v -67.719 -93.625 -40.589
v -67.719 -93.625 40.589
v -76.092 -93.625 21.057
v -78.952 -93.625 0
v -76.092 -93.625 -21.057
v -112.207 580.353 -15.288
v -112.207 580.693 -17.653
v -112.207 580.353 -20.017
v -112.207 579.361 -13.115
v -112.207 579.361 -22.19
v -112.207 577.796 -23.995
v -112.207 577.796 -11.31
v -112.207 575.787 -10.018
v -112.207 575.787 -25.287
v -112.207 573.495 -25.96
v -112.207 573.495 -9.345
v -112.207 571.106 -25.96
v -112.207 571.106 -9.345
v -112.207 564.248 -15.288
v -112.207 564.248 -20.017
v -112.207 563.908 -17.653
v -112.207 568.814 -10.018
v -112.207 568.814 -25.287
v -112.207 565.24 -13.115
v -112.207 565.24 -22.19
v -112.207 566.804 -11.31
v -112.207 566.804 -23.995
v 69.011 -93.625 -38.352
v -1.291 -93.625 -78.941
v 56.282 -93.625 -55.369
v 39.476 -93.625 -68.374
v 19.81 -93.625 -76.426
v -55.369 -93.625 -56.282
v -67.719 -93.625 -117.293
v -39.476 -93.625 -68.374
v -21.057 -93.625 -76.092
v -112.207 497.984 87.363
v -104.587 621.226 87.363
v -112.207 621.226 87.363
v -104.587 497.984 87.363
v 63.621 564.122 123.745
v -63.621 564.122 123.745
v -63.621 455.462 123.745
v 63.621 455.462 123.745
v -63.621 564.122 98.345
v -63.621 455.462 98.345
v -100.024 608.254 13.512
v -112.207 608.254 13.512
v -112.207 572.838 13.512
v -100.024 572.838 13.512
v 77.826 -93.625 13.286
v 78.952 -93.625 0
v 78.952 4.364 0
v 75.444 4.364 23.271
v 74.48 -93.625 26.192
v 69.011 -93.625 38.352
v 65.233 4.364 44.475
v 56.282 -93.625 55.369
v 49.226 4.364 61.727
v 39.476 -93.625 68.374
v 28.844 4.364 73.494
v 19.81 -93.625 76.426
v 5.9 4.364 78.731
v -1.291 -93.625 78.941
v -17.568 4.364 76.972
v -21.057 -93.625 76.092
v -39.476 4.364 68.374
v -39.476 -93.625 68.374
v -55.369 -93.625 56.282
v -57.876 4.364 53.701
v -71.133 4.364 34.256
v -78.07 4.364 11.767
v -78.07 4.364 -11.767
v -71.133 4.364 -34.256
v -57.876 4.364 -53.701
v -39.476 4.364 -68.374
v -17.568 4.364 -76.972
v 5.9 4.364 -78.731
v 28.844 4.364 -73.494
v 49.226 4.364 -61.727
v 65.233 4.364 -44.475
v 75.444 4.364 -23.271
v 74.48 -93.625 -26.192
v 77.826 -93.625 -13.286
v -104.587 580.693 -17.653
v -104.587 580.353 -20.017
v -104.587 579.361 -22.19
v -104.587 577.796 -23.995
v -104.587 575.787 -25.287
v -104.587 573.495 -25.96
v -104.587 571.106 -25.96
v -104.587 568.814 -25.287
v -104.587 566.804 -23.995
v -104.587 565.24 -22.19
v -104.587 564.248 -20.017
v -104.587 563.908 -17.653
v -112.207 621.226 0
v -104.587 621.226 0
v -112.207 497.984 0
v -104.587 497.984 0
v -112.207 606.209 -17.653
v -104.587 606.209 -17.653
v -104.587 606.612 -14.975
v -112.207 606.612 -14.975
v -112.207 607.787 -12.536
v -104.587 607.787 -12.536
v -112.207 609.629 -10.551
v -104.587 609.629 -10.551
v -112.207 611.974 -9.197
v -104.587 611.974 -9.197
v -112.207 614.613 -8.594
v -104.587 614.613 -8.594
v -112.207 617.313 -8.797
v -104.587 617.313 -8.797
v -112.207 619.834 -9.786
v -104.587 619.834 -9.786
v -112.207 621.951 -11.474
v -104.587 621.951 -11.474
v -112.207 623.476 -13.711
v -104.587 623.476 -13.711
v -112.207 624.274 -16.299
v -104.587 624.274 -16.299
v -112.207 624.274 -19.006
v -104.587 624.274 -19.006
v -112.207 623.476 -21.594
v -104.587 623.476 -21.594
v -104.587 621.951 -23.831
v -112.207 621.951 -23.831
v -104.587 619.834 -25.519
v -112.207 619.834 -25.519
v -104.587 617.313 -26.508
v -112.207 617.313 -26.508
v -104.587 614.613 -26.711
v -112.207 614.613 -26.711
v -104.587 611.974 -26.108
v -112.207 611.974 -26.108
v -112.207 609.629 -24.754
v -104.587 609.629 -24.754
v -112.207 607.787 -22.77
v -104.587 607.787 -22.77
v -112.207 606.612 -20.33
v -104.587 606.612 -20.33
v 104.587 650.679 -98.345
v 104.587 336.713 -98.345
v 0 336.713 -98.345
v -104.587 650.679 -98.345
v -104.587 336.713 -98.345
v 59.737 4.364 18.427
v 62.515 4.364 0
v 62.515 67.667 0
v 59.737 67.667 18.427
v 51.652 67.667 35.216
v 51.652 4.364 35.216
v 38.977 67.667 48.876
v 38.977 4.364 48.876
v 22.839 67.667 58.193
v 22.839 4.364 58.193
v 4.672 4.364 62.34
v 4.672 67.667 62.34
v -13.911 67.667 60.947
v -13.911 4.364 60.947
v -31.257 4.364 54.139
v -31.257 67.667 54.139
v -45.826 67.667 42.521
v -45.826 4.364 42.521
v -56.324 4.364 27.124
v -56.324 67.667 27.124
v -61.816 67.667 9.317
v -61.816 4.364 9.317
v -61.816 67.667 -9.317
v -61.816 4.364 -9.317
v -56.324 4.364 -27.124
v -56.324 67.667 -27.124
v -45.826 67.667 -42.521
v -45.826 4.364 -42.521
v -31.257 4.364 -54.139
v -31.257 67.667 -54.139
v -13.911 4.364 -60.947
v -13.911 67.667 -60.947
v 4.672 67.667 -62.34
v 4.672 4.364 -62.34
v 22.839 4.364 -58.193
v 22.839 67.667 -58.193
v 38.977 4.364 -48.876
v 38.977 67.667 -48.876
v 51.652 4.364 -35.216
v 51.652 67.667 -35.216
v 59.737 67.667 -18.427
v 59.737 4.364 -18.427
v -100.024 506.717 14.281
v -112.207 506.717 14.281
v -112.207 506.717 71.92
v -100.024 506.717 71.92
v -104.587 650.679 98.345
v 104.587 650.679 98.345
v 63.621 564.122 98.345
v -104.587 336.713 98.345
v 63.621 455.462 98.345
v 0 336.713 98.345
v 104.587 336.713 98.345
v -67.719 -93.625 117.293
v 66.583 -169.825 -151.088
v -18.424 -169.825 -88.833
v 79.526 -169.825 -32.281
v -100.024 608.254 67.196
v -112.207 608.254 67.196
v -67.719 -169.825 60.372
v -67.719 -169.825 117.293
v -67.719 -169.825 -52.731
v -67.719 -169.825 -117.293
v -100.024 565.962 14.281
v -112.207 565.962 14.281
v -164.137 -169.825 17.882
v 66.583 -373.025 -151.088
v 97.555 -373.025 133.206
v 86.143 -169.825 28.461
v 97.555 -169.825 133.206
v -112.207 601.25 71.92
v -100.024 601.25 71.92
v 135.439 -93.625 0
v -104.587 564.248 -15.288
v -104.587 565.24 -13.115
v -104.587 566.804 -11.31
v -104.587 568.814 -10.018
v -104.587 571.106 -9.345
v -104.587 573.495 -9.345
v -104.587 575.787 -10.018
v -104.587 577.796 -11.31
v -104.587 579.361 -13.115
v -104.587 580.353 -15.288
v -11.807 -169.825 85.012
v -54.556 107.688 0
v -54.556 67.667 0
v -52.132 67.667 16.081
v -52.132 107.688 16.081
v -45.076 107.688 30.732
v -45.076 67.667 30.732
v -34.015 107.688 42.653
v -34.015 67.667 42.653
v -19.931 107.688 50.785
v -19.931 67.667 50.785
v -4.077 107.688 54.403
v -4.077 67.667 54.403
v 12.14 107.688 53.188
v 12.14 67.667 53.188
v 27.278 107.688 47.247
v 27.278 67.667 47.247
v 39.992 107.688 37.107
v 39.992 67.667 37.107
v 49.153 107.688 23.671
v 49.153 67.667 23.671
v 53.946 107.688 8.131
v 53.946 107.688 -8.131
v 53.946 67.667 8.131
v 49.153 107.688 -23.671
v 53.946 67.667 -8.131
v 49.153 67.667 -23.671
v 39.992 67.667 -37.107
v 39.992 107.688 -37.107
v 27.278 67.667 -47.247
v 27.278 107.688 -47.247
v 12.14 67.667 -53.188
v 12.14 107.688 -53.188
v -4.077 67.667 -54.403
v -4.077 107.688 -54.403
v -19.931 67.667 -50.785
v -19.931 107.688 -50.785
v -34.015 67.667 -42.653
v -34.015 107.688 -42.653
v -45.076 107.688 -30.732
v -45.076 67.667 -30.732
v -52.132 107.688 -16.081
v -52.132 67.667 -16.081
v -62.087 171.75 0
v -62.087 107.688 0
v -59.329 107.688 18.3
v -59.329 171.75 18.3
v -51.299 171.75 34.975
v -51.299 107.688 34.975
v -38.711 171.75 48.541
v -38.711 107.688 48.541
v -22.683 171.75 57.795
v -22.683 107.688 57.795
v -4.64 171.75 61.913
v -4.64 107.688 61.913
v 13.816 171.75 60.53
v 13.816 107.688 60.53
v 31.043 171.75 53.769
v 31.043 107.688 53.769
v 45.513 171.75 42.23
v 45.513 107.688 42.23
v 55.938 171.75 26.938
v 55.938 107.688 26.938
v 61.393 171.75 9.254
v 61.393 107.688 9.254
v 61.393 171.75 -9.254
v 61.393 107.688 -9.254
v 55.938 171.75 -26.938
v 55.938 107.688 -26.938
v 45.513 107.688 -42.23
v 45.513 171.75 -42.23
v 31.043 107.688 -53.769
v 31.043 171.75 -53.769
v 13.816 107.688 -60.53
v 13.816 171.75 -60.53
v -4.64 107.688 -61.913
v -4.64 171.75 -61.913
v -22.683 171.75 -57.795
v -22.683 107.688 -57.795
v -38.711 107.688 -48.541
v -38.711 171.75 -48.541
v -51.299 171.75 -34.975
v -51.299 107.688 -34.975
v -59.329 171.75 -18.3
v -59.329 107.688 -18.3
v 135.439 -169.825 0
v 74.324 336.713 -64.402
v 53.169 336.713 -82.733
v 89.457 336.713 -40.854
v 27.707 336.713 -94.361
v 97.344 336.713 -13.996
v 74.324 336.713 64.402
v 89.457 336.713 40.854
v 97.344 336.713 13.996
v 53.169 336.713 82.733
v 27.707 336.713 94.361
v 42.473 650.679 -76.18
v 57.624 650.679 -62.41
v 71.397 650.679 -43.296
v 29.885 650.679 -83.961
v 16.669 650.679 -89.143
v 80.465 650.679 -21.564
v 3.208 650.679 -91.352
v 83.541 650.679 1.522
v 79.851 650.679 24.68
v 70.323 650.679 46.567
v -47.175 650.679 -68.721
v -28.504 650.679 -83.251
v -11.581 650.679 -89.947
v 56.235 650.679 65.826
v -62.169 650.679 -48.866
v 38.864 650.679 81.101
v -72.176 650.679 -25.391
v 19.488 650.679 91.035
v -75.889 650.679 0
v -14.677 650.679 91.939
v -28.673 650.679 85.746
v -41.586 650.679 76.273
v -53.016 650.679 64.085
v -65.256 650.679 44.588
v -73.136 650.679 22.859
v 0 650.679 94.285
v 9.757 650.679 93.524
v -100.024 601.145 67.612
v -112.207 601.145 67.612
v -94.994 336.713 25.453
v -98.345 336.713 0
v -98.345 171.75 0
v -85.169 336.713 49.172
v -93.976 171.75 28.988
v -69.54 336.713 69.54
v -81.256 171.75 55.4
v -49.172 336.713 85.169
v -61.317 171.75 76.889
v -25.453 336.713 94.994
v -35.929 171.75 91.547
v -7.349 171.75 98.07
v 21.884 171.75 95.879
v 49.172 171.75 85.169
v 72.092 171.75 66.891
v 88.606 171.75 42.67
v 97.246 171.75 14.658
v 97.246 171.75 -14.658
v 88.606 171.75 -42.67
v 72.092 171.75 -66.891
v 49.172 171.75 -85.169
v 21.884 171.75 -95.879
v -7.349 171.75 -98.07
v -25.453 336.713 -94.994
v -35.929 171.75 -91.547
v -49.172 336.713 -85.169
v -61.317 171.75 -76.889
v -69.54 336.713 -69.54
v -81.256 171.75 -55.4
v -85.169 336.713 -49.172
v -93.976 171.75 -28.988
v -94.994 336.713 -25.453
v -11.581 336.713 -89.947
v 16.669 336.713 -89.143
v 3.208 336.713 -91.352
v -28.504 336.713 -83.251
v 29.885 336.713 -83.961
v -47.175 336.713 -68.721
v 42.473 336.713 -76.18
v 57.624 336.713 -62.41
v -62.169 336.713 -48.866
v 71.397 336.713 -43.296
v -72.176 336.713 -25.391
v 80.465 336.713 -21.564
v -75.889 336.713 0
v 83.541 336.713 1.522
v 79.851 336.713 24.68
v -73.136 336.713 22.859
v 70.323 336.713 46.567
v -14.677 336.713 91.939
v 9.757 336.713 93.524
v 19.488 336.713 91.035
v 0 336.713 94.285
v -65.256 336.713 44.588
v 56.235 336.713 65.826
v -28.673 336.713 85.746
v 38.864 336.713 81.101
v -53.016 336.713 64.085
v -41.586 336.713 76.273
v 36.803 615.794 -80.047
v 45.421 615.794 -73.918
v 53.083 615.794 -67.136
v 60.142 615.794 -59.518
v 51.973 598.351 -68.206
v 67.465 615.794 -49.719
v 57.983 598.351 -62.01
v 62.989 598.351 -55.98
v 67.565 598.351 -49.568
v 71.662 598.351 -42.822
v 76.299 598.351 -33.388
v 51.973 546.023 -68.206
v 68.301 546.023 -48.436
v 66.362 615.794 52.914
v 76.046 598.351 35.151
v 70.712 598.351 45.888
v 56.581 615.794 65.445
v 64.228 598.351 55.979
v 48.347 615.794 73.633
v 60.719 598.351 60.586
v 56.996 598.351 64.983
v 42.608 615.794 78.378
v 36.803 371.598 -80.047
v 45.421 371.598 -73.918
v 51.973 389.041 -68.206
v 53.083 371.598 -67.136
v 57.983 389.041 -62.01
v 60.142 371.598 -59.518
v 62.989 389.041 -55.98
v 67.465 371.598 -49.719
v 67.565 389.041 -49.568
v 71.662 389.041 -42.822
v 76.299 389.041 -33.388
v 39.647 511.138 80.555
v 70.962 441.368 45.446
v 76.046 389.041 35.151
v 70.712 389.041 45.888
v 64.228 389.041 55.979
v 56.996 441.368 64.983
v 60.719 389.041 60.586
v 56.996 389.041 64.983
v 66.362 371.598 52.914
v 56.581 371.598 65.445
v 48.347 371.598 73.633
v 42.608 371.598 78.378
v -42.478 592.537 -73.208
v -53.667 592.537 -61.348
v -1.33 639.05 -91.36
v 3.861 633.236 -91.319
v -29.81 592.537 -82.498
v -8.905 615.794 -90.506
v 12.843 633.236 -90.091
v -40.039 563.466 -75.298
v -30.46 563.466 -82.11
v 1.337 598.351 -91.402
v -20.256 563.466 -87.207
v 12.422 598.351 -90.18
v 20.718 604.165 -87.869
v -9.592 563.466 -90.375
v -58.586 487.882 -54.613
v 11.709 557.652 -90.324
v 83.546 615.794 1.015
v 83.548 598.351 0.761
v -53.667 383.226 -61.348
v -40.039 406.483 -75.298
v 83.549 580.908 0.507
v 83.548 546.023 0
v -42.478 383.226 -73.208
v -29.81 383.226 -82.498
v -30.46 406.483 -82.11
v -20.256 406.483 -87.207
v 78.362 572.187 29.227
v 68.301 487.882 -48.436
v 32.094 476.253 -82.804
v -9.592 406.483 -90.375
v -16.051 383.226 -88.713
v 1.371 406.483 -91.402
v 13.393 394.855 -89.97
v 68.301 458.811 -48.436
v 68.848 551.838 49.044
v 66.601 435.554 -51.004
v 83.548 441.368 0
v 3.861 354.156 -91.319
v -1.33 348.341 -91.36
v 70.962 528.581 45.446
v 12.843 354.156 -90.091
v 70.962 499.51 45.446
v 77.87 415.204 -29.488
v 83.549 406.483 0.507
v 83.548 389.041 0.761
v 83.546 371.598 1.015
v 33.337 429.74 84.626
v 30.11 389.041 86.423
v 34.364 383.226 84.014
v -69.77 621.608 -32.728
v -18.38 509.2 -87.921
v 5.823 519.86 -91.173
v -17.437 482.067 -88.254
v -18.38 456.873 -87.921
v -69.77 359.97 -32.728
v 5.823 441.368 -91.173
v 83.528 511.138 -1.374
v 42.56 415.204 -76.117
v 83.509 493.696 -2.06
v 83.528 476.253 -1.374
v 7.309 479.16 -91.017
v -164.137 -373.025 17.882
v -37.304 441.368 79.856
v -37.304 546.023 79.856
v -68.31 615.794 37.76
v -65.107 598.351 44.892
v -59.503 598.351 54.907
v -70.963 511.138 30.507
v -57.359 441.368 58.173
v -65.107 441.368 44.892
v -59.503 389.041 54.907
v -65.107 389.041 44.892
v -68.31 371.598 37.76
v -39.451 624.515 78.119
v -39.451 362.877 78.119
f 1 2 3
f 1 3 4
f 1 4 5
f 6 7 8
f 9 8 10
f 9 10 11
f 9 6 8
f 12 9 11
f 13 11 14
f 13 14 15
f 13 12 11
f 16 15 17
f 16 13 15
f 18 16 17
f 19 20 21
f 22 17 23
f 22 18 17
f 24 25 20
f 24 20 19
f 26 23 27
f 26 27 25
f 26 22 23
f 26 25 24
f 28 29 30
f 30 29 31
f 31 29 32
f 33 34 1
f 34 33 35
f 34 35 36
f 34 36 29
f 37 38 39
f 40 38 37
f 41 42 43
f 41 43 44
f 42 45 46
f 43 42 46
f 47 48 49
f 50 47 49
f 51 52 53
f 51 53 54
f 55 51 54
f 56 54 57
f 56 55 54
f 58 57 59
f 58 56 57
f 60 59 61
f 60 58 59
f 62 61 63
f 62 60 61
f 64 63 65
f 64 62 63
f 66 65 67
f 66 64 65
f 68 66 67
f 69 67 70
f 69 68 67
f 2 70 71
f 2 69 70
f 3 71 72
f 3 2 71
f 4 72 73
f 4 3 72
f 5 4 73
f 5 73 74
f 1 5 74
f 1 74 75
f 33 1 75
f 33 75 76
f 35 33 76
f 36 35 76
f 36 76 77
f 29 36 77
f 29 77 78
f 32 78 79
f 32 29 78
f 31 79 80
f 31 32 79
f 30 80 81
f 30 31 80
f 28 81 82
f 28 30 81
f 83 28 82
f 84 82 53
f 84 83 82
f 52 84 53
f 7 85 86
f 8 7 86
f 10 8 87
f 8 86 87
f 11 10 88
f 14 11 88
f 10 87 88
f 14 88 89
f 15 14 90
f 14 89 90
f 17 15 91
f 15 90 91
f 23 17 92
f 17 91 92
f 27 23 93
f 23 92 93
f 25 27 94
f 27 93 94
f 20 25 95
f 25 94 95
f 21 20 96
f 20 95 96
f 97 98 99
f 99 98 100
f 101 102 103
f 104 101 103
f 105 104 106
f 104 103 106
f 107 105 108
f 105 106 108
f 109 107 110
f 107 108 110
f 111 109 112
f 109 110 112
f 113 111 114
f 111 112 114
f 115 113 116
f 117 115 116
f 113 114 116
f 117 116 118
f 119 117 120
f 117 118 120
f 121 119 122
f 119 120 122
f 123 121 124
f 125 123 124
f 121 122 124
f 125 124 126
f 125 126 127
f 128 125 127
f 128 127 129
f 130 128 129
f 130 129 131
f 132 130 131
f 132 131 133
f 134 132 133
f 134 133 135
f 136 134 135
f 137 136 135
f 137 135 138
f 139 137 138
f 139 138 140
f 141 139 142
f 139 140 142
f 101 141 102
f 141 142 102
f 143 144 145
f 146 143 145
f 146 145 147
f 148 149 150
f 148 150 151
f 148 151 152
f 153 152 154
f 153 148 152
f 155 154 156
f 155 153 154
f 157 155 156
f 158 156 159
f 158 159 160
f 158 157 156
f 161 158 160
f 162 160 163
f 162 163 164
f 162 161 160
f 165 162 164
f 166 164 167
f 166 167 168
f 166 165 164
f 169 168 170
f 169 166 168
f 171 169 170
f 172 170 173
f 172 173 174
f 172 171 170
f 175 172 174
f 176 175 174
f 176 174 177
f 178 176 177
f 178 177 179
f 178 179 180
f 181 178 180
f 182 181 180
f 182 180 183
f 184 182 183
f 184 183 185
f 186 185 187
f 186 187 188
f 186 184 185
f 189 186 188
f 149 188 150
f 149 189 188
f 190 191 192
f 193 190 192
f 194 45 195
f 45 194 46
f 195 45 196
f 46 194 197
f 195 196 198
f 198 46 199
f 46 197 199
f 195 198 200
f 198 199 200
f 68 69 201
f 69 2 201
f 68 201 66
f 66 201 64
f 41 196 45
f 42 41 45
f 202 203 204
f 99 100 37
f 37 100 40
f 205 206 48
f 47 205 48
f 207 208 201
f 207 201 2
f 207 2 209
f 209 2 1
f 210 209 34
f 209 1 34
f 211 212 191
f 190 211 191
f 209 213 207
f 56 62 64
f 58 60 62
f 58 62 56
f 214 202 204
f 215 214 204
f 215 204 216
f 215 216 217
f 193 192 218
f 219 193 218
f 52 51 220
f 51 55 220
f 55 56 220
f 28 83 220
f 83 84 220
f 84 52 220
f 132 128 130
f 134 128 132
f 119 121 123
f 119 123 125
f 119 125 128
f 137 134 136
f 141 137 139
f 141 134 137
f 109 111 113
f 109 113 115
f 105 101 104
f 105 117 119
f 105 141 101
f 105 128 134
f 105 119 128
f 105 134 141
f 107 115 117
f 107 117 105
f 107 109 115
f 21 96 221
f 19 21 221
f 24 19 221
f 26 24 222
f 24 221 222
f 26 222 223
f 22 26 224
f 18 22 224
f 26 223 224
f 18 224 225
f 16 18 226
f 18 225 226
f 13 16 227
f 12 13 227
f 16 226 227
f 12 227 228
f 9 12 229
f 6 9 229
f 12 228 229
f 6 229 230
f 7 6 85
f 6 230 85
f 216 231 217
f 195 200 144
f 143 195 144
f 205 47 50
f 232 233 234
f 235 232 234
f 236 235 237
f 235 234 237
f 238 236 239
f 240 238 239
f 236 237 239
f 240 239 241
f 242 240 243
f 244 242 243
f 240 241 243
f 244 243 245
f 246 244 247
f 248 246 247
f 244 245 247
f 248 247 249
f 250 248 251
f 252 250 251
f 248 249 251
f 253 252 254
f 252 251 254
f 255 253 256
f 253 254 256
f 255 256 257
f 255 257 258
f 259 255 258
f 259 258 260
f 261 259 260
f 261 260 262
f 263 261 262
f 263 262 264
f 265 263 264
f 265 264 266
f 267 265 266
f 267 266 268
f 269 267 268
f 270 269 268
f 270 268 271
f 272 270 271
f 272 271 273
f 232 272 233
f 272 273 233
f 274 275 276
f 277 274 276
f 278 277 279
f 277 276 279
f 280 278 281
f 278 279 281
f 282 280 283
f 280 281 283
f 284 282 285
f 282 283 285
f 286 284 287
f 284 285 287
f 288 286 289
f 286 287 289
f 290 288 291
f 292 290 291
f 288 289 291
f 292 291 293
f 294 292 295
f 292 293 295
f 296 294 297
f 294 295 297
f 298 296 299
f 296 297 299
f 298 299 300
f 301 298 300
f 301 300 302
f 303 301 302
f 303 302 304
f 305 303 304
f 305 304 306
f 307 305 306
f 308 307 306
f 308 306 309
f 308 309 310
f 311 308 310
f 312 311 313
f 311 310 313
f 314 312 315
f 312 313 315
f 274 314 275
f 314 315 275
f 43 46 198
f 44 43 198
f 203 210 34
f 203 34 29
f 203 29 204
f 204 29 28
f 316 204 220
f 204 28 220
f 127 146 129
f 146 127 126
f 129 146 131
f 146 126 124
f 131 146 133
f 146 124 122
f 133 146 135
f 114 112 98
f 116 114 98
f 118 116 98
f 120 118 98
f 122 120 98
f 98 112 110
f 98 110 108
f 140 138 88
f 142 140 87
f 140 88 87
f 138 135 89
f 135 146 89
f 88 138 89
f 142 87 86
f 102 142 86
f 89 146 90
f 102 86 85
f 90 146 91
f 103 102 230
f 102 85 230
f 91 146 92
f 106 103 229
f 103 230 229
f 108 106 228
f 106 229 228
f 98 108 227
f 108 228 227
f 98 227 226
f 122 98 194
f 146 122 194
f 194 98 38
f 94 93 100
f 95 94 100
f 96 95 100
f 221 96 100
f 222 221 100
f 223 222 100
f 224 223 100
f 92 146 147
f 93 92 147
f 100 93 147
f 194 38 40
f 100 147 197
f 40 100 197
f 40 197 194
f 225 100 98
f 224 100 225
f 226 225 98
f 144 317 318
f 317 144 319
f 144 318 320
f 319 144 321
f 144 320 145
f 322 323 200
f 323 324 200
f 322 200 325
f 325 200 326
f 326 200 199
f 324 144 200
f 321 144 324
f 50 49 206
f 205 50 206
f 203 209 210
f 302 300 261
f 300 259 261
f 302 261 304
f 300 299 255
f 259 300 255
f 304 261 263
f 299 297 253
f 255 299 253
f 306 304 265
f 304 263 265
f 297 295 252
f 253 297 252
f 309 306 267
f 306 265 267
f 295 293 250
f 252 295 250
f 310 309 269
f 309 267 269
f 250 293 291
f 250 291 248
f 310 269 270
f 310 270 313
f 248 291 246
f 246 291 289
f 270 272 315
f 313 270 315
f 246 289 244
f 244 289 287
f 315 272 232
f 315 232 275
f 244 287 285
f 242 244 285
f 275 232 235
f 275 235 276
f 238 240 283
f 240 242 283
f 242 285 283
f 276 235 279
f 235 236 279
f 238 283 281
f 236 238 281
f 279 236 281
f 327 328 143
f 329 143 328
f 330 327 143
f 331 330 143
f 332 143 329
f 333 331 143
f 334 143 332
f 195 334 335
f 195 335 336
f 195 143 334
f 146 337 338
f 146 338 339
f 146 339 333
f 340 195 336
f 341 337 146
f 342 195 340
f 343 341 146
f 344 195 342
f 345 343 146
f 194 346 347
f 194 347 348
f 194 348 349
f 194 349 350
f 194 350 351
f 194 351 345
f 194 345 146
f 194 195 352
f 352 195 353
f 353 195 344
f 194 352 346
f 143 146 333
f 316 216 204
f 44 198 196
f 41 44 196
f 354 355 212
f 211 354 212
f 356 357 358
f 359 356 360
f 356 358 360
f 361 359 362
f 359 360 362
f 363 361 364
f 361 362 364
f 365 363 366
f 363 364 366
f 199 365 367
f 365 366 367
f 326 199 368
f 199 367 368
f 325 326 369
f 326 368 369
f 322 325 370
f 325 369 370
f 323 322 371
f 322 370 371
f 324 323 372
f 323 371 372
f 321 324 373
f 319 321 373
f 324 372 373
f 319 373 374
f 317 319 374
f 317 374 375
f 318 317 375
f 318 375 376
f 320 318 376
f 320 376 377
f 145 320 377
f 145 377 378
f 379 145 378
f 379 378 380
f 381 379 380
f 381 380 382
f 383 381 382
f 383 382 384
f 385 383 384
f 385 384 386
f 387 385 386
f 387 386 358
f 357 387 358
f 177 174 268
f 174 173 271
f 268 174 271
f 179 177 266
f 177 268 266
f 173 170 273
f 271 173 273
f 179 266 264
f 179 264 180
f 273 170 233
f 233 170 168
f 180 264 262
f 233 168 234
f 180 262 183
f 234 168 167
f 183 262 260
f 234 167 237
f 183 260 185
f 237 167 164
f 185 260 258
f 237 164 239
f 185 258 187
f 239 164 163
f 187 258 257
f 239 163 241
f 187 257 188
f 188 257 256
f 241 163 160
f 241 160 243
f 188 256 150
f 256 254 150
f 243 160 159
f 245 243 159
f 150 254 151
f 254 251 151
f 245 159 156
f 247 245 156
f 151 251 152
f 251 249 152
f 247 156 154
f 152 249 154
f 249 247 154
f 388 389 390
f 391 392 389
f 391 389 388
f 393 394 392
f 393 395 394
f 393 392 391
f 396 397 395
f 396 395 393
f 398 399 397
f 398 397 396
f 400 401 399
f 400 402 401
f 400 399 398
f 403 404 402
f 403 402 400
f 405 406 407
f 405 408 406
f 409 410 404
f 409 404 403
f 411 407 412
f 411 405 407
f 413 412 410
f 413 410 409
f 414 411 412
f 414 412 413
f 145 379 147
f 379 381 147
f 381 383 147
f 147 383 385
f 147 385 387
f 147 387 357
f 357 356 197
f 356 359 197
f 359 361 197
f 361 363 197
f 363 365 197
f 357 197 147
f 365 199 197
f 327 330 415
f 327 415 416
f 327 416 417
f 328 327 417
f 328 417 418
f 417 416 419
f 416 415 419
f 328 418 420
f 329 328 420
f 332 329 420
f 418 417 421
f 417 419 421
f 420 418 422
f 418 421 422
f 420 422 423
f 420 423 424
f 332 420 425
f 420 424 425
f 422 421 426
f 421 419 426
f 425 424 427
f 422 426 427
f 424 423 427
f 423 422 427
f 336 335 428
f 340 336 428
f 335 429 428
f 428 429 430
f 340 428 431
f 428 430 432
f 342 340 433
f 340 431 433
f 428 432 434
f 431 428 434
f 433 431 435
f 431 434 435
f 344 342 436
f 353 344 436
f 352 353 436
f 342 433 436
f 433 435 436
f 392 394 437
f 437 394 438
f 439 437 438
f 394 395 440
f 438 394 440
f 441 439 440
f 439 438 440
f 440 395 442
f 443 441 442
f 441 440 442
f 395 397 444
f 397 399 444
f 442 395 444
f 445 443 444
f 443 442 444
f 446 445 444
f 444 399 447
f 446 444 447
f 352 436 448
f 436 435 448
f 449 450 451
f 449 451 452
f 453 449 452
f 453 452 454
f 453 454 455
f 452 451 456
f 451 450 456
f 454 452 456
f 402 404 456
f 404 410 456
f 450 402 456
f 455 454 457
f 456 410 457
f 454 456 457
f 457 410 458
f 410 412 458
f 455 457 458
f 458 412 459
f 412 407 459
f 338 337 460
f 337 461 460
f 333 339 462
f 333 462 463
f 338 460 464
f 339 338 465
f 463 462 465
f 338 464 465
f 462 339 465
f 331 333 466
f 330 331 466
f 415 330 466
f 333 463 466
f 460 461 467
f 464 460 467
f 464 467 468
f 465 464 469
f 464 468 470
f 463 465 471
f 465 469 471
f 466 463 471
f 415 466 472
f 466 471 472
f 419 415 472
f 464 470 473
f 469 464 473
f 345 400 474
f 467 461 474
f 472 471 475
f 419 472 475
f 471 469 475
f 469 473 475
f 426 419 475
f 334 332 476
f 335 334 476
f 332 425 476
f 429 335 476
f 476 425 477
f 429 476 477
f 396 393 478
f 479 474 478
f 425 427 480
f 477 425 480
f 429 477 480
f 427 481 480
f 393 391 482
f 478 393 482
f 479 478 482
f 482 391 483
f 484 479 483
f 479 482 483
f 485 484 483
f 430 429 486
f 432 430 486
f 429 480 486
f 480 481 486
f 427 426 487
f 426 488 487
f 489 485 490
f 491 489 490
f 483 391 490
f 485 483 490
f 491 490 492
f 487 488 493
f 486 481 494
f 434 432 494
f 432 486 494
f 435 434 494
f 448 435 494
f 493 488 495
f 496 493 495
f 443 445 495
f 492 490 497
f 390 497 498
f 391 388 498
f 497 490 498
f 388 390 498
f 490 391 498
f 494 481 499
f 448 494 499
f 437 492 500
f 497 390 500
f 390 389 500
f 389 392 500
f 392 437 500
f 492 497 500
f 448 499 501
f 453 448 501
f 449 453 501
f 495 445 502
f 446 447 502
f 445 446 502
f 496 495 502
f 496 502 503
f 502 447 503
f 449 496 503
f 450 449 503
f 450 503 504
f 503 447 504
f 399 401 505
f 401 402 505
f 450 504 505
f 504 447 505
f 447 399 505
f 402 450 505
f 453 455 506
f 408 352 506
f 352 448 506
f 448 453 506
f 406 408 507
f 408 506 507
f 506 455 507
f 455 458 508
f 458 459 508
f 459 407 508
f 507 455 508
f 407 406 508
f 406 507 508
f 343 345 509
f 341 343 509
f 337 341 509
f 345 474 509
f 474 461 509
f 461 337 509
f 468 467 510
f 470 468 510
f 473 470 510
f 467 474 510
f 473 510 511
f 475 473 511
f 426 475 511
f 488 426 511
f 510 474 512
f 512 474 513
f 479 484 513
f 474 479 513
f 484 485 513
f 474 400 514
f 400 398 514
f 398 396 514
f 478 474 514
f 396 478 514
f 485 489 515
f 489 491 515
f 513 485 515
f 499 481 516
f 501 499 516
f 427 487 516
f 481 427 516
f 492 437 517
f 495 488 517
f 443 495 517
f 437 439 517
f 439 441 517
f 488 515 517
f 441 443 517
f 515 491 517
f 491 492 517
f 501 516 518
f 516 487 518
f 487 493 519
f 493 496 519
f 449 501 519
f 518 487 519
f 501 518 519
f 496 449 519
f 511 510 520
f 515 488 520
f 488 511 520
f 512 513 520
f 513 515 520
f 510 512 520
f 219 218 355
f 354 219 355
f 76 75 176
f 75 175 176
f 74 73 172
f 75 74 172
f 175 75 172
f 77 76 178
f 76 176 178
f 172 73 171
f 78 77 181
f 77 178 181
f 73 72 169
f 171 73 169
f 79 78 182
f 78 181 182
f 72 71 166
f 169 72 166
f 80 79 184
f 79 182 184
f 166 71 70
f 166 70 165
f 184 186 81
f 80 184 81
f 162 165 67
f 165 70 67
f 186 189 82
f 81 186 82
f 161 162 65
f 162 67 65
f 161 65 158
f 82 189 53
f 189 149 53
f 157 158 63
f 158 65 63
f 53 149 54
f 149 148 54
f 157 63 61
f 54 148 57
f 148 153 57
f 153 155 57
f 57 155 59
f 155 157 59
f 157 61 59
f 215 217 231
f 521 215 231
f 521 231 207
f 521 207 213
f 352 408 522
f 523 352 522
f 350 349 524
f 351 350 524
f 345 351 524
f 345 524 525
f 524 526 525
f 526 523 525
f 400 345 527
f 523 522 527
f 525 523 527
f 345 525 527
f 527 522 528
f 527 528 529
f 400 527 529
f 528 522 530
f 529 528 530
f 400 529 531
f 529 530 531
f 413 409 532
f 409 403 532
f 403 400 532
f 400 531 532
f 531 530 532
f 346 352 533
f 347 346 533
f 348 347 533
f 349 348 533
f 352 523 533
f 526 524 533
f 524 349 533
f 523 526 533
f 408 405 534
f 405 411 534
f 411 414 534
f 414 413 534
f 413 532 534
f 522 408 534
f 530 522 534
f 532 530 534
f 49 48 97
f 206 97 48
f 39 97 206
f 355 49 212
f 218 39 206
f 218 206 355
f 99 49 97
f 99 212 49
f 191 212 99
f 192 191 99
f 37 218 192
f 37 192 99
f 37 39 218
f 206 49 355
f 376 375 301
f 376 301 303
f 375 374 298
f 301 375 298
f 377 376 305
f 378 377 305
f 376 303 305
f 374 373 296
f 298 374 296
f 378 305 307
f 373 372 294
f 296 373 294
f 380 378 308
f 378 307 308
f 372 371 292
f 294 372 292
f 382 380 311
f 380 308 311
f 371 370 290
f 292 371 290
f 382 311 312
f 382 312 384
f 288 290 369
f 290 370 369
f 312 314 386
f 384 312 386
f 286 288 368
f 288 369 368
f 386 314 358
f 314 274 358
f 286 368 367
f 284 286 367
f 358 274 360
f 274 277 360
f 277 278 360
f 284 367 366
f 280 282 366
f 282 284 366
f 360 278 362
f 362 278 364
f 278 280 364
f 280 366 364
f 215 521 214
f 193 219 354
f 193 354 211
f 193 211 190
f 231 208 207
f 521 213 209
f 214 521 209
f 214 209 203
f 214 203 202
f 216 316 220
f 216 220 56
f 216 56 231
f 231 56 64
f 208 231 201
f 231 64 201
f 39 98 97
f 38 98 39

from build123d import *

# Parameters (mm, degrees)
F0_R          = 62.5146568837
F1_DEPTH      = 93.62484
F1_DEPTH_BACK = 67.66725
F2_R          = 78.9516087872
F3_DEPTH      = 97.98912
F4_R          = 54.5557763687
F5_DEPTH      = 40.02087
F6_R          = 62.0868515923
F7_DEPTH      = 64.06144
F8_R          = 98.3447043225
F9_DEPTH      = 164.96345
F11_DEPTH     = 313.96558
F12_W         = 63.6207908392
F12_H         = 54.3301105499
F13_DEPTH     = 25.4
F15_DEPTH     = 76.2
F17_DEPTH     = 203.2
F18_W         = 123.2421994209
F18_H         = 87.3634591699
F18_R         = 9.0836409793
F20_DEPTH     = 7.62
F22_DEPTH     = 12.18293


with BuildPart() as f1:
    # F0 (on Front) → F1 (new body, two sides)
    with BuildSketch(Plane.XZ) as f1_sk:
        Circle(F0_R)
    extrude(amount=F1_DEPTH)
    extrude(f1_sk.sketch, amount=-F1_DEPTH_BACK)

    # F2 (on face) → F3 (join)
    with BuildSketch(Plane.XZ.offset(93.62484)):
        Circle(F2_R)
    extrude(amount=-F3_DEPTH)

    # F4 (on face) → F5 (join)
    with BuildSketch(Plane(origin=(0, 67.66725, 0), x_dir=(-1, 0, 0), z_dir=(0, 1, 0))):
        Circle(F4_R)
    extrude(amount=F5_DEPTH)

    # F6 (on face) → F7 (join)
    with BuildSketch(Plane(origin=(0, 107.68812, 0), x_dir=(-1, 0, 0), z_dir=(0, 1, 0))):
        Circle(F6_R)
    extrude(amount=F7_DEPTH)

    # F8 (on face) → F9 (join)
    with BuildSketch(Plane(origin=(0, 171.74956, 0), x_dir=(-1, 0, 0), z_dir=(0, 1, 0))):
        Circle(F8_R)
    extrude(amount=F9_DEPTH)

    # F10 (on face) → F11 (join)
    with BuildSketch(Plane(origin=(0, 336.71301, 0), x_dir=(-1, 0, 0), z_dir=(0, 1, 0))):
        with BuildLine():
            add(Edge.make_bspline(
                [(0, -91.3981422782), (-40.1217959726, -92.0347084682), (-83.3063936827, -46.5341806253), (-83.5479795933, 0)],
                knots=[0.748537523, 0.748537523, 0.748537523, 0.748537523, 1, 1, 1, 1], degree=3))
            Line((-83.5479795933, 0), (-104.587353766, 0))
            Line((-104.587353766, 0), (-104.587353766, -98.3447043225))
            Line((-104.587353766, -98.3447043225), (0, -98.3447043225))
            Line((0, -98.3447043225), (0, -91.3981422782))
        make_face()
        with BuildLine():
            Line((-104.587353766, 0), (-83.5479795933, 0))
            add(Edge.make_bspline(
                [(-83.5479795933, 0), (-83.7916500228, 46.9356998238), (-40.34804577, 94.9229670887), (0, 94.285428524)],
                knots=[0, 0, 0, 0, 0.2536322157, 0.2536322157, 0.2536322157, 0.2536322157], degree=3))
            Line((0, 94.285428524), (0, 98.3447043225))
            Line((0, 98.3447043225), (-104.587353766, 98.3447043225))
            Line((-104.587353766, 98.3447043225), (-104.587353766, 0))
        make_face()
        with BuildLine():
            Line((0, 98.3447043225), (0, 94.285428524))
            add(Edge.make_bspline(
                [(0, 94.285428524), (39.5484573968, 93.6605242373), (76.1228316851, 46.3189404004), (75.8891776204, 0)],
                knots=[0.2536322157, 0.2536322157, 0.2536322157, 0.2536322157, 0.5022381317, 0.5022381317, 0.5022381317, 0.5022381317], degree=3))
            Line((75.8891776204, 0), (104.587353766, 0))
            Line((104.587353766, 0), (104.587353766, 98.3447043225))
            Line((104.587353766, 98.3447043225), (0, 98.3447043225))
        make_face()
        with BuildLine():
            Line((104.587353766, 0), (75.8891776204, 0))
            add(Edge.make_bspline(
                [(75.8891776204, 0), (75.6576913596, -45.8892009211), (39.2980059924, -90.7746462122), (0, -91.3981422782)],
                knots=[0.5022381317, 0.5022381317, 0.5022381317, 0.5022381317, 0.748537523, 0.748537523, 0.748537523, 0.748537523], degree=3))
            Line((0, -91.3981422782), (0, -98.3447043225))
            Line((0, -98.3447043225), (104.587353766, -98.3447043225))
            Line((104.587353766, -98.3447043225), (104.587353766, 0))
        make_face()
    extrude(amount=F11_DEPTH)

    # F12 (on face) → F13 (join)
    with BuildSketch(Plane.XY.offset(98.3447043225)):
        with Locations((31.8103954196, 536.9567275047)):
            Rectangle(F12_W, F12_H)
        with Locations((-31.8103954196, 536.9567275047)):
            Rectangle(F12_W, F12_H)
        with Locations((31.8103954196, 482.6266169548)):
            Rectangle(F12_W, F12_H)
        with Locations((-31.8103954196, 482.6266169548)):
            Rectangle(F12_W, F12_H)
    extrude(amount=F13_DEPTH)

    # F14 (on face) → F15 (join)
    with BuildSketch(Plane.XZ.offset(93.62484)):
        Polygon((-67.7192732692, 117.2932219539), (-67.7192732692, -117.2932219539), (135.4385465384, 0), align=None)
    extrude(amount=F15_DEPTH)

    # F16 (on face) → F17 (join)
    with BuildSketch(Plane.XZ.offset(169.82484)):
        Polygon((97.5546226371, 133.206090602), (-164.1371697187, 17.8817361593), (66.5825470816, -151.0878267614), align=None)
    extrude(amount=F17_DEPTH)

    # F18 (on face) → F20 (join)
    with BuildSketch(Plane(origin=(-104.587353766, 0, 0), x_dir=(0, -1, 0), z_dir=(-1, 0, 0))):
        with Locations((-559.6050322056, 43.6817295849)):
            Rectangle(F18_W, F18_H)
        with Locations((-615.2921915054, -17.6525395364)):
            Circle(F18_R)
        with BuildLine():
            ThreePointArc((-563.9078745674, -17.6525395364), (-572.3003745079, -9.2600395959), (-580.6928744484, -17.6525395364))
            ThreePointArc((-580.6928744484, -17.6525395364), (-572.3003745079, -26.0450394768), (-563.9078745674, -17.6525395364))
        make_face()
    extrude(amount=F20_DEPTH)

    # F21 (on face) → F22 (cut)
    with BuildSketch(Plane(origin=(-112.207353766, 0, 0), x_dir=(0, -1, 0), z_dir=(-1, 0, 0))):
        Polygon((-572.8379487991, 13.5121122003), (-608.2543730736, 67.1958848834), (-608.2543730736, 13.5121122003), align=None)
        Polygon((-601.2495756149, 71.9198659062), (-601.1453866959, 67.6123201847), (-565.961514646, 14.2810472532), (-506.7166686058, 14.2810472532), (-506.7166686058, 71.9198659062), align=None)
    extrude(amount=-F22_DEPTH, mode=Mode.SUBTRACT)


solid = f1.part
